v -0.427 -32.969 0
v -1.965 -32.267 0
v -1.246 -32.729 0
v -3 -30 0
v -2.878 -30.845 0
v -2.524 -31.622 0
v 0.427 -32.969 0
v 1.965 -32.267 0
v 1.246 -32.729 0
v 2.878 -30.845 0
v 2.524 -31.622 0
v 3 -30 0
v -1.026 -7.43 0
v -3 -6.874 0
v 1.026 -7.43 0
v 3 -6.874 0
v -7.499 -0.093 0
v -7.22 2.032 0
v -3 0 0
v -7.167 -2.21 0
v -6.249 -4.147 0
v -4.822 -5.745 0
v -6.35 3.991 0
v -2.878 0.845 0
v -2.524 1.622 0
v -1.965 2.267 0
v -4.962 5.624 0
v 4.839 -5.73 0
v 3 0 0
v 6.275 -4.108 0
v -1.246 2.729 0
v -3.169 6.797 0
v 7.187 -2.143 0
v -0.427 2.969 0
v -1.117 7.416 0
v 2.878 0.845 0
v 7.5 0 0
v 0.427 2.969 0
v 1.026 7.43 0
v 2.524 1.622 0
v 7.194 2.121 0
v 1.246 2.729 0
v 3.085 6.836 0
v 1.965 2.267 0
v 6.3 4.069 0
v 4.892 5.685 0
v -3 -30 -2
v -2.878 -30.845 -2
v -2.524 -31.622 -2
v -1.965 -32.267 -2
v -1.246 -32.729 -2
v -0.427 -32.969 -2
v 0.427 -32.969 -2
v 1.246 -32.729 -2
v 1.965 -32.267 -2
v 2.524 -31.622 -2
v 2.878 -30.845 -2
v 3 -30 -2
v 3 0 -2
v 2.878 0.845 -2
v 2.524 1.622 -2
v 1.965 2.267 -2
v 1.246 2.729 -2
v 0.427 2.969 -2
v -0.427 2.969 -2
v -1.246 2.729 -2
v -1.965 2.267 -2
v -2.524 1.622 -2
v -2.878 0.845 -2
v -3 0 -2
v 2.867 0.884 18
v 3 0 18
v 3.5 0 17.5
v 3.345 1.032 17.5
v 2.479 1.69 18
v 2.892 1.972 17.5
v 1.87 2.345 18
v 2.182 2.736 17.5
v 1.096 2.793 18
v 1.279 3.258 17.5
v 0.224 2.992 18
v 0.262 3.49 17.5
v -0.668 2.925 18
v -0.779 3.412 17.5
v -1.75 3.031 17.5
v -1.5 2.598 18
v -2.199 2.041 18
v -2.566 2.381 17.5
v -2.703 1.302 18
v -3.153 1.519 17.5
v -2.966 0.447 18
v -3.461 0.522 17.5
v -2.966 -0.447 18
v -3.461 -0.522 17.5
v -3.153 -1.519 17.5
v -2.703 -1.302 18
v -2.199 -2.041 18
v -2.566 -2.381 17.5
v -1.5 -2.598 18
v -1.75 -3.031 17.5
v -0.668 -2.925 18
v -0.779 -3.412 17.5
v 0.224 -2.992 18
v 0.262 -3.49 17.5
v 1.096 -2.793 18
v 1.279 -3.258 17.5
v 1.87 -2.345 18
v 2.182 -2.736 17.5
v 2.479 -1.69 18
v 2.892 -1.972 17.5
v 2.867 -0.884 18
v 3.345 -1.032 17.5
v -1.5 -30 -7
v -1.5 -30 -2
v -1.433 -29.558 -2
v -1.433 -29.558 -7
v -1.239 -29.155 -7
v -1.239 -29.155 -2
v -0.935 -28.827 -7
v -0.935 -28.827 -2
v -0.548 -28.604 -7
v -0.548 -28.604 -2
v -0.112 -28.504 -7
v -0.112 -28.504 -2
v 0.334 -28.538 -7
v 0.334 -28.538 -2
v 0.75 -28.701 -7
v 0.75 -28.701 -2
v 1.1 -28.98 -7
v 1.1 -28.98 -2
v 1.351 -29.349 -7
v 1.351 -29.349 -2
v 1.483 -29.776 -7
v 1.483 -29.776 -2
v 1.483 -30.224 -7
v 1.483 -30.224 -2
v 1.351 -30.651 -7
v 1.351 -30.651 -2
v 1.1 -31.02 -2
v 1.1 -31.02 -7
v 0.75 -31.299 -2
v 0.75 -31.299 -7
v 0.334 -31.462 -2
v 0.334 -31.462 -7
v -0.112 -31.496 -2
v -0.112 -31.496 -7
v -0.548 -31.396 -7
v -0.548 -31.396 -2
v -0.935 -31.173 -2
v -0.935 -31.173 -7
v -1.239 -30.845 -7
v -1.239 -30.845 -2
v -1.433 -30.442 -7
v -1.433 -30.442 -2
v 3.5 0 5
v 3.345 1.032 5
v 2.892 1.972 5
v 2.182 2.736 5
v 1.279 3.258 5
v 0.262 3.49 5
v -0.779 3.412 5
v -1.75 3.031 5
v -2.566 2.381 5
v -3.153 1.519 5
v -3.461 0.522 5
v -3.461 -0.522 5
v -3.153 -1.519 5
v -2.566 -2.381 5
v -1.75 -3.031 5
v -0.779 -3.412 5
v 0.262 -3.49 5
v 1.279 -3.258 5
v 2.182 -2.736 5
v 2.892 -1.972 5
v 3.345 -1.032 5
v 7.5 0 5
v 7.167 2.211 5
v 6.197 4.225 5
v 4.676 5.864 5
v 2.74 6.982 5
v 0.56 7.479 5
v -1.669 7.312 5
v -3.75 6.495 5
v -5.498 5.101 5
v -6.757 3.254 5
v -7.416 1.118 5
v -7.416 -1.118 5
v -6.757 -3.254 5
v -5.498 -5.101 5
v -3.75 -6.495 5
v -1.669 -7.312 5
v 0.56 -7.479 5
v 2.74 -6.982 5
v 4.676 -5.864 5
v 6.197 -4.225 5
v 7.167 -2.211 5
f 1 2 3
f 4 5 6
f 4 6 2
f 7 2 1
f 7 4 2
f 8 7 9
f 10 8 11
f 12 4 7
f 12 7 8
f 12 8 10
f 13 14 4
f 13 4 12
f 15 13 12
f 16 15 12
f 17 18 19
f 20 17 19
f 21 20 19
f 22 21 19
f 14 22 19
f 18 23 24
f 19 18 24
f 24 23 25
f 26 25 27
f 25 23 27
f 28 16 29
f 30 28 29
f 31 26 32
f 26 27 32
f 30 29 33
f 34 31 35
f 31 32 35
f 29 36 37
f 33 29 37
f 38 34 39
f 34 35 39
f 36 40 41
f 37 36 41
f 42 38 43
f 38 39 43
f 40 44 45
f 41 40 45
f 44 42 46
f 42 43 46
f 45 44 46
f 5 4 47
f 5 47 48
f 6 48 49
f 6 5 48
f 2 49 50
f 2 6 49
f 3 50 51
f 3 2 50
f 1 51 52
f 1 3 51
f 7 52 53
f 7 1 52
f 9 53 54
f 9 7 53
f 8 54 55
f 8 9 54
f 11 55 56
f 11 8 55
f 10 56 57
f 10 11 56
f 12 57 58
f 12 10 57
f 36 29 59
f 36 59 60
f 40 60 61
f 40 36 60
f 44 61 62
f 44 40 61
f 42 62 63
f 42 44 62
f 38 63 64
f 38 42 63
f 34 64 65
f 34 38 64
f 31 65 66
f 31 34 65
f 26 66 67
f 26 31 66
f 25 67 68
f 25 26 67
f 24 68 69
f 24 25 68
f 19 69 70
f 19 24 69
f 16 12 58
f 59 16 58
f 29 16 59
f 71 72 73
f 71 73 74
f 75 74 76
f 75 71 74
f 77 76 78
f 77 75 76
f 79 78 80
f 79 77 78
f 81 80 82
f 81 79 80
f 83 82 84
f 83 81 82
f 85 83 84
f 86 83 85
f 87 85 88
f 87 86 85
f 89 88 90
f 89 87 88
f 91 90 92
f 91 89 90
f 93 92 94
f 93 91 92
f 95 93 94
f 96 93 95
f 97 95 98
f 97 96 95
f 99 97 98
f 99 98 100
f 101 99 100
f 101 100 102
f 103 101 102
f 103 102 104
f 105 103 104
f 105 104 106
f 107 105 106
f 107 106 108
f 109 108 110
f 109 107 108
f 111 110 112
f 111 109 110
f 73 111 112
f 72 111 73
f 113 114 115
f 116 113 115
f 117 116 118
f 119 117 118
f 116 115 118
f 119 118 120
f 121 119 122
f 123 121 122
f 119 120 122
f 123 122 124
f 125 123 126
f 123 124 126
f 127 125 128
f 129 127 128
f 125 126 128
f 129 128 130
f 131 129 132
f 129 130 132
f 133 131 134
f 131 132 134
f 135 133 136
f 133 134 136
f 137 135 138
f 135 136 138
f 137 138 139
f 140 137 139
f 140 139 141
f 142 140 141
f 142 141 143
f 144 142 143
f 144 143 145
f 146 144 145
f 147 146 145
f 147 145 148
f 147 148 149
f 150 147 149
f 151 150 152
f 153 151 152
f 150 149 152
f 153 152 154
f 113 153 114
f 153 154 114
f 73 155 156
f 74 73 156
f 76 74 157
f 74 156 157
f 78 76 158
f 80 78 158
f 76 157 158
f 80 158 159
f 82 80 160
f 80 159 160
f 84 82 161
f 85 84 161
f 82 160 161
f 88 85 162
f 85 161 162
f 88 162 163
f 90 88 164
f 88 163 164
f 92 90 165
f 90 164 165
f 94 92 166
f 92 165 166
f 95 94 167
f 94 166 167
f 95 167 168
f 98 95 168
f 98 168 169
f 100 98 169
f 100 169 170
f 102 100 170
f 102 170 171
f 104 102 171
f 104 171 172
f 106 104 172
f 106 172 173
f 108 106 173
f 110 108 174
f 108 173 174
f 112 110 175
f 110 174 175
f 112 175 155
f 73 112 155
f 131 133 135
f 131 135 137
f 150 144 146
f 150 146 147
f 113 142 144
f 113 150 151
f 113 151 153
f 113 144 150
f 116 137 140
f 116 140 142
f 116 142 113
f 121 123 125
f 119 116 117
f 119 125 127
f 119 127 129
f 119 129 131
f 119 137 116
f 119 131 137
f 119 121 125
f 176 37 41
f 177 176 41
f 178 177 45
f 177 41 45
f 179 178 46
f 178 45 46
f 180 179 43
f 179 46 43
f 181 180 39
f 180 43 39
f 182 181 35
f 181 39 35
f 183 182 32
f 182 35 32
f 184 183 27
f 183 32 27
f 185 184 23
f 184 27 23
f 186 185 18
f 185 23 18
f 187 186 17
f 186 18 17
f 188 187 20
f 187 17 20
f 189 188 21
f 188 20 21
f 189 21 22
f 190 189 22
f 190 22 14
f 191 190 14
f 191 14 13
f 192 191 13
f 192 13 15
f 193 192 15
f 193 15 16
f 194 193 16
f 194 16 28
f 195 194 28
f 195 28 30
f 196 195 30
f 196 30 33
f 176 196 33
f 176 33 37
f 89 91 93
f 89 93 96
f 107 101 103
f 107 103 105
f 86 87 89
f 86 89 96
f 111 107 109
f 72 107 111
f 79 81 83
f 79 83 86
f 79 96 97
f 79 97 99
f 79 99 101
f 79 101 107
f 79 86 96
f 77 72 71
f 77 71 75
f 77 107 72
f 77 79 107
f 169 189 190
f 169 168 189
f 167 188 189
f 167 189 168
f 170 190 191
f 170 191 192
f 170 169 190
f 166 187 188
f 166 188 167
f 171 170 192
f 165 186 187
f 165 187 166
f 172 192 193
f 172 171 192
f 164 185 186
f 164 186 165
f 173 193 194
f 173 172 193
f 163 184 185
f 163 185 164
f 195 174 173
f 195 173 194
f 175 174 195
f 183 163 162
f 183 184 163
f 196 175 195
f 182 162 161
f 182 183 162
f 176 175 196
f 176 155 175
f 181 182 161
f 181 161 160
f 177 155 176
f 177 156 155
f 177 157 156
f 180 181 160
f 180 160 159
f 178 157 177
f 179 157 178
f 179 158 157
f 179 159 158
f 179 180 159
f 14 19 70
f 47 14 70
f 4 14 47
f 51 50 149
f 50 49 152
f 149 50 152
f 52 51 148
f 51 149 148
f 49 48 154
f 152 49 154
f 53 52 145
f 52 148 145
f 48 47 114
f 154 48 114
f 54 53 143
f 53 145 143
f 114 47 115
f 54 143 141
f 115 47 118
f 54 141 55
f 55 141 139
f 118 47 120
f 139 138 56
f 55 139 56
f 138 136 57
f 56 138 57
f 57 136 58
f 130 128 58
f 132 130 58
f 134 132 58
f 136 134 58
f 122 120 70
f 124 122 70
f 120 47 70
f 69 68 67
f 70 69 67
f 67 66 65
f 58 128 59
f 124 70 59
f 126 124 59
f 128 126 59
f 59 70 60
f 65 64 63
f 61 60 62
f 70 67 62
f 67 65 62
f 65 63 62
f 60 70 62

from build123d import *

# Parameters (mm, degrees)
SKETCH1_R           = 7.5
BOSS_EXTRUDE1_DEPTH = 5
SKETCH2_R           = 3.5
BOSS_EXTRUDE2_DEPTH = 13
CHAMFER1_SIZE       = 0.5
BOSS_EXTRUDE3_DEPTH = 2
SKETCH4_R           = 1.5
BOSS_EXTRUDE4_DEPTH = 5


with BuildPart() as part:
    # Sketch1 → Boss-Extrude1 (new body)
    with BuildSketch(Plane.XY):
        Circle(SKETCH1_R)
    extrude(amount=BOSS_EXTRUDE1_DEPTH)

    # Sketch2 → Boss-Extrude2 (add)
    with BuildSketch(Plane.XY.offset(5)):
        Circle(SKETCH2_R)
    extrude(amount=BOSS_EXTRUDE2_DEPTH)

    # Chamfer1
    chamfer1_edges = [part.edges().sort_by_distance(p)[0] for p in [
        (-3.5, 0, 18),
    ]]
    chamfer(chamfer1_edges, length=CHAMFER1_SIZE)

    # Sketch3 → Boss-Extrude3 (add)
    with BuildSketch(Plane(origin=(0, 0, 0), x_dir=(-1, 0, 0), z_dir=(0, 0, -1))):
        with BuildLine():
            Line((3, 0), (3, -30))
            ThreePointArc((3, -30), (0, -33), (-3, -30))
            Line((-3, -30), (-3, 0))
            ThreePointArc((-3, 0), (0, 3), (3, 0))
        make_face()
    extrude(amount=BOSS_EXTRUDE3_DEPTH)

    # Sketch4 → Boss-Extrude4 (add)
    with BuildSketch(Plane(origin=(0, 0, -2), x_dir=(-1, 0, 0), z_dir=(0, 0, -1))):
        with Locations((0, -30)):
            Circle(SKETCH4_R)
    extrude(amount=BOSS_EXTRUDE4_DEPTH)


solid = part.part
